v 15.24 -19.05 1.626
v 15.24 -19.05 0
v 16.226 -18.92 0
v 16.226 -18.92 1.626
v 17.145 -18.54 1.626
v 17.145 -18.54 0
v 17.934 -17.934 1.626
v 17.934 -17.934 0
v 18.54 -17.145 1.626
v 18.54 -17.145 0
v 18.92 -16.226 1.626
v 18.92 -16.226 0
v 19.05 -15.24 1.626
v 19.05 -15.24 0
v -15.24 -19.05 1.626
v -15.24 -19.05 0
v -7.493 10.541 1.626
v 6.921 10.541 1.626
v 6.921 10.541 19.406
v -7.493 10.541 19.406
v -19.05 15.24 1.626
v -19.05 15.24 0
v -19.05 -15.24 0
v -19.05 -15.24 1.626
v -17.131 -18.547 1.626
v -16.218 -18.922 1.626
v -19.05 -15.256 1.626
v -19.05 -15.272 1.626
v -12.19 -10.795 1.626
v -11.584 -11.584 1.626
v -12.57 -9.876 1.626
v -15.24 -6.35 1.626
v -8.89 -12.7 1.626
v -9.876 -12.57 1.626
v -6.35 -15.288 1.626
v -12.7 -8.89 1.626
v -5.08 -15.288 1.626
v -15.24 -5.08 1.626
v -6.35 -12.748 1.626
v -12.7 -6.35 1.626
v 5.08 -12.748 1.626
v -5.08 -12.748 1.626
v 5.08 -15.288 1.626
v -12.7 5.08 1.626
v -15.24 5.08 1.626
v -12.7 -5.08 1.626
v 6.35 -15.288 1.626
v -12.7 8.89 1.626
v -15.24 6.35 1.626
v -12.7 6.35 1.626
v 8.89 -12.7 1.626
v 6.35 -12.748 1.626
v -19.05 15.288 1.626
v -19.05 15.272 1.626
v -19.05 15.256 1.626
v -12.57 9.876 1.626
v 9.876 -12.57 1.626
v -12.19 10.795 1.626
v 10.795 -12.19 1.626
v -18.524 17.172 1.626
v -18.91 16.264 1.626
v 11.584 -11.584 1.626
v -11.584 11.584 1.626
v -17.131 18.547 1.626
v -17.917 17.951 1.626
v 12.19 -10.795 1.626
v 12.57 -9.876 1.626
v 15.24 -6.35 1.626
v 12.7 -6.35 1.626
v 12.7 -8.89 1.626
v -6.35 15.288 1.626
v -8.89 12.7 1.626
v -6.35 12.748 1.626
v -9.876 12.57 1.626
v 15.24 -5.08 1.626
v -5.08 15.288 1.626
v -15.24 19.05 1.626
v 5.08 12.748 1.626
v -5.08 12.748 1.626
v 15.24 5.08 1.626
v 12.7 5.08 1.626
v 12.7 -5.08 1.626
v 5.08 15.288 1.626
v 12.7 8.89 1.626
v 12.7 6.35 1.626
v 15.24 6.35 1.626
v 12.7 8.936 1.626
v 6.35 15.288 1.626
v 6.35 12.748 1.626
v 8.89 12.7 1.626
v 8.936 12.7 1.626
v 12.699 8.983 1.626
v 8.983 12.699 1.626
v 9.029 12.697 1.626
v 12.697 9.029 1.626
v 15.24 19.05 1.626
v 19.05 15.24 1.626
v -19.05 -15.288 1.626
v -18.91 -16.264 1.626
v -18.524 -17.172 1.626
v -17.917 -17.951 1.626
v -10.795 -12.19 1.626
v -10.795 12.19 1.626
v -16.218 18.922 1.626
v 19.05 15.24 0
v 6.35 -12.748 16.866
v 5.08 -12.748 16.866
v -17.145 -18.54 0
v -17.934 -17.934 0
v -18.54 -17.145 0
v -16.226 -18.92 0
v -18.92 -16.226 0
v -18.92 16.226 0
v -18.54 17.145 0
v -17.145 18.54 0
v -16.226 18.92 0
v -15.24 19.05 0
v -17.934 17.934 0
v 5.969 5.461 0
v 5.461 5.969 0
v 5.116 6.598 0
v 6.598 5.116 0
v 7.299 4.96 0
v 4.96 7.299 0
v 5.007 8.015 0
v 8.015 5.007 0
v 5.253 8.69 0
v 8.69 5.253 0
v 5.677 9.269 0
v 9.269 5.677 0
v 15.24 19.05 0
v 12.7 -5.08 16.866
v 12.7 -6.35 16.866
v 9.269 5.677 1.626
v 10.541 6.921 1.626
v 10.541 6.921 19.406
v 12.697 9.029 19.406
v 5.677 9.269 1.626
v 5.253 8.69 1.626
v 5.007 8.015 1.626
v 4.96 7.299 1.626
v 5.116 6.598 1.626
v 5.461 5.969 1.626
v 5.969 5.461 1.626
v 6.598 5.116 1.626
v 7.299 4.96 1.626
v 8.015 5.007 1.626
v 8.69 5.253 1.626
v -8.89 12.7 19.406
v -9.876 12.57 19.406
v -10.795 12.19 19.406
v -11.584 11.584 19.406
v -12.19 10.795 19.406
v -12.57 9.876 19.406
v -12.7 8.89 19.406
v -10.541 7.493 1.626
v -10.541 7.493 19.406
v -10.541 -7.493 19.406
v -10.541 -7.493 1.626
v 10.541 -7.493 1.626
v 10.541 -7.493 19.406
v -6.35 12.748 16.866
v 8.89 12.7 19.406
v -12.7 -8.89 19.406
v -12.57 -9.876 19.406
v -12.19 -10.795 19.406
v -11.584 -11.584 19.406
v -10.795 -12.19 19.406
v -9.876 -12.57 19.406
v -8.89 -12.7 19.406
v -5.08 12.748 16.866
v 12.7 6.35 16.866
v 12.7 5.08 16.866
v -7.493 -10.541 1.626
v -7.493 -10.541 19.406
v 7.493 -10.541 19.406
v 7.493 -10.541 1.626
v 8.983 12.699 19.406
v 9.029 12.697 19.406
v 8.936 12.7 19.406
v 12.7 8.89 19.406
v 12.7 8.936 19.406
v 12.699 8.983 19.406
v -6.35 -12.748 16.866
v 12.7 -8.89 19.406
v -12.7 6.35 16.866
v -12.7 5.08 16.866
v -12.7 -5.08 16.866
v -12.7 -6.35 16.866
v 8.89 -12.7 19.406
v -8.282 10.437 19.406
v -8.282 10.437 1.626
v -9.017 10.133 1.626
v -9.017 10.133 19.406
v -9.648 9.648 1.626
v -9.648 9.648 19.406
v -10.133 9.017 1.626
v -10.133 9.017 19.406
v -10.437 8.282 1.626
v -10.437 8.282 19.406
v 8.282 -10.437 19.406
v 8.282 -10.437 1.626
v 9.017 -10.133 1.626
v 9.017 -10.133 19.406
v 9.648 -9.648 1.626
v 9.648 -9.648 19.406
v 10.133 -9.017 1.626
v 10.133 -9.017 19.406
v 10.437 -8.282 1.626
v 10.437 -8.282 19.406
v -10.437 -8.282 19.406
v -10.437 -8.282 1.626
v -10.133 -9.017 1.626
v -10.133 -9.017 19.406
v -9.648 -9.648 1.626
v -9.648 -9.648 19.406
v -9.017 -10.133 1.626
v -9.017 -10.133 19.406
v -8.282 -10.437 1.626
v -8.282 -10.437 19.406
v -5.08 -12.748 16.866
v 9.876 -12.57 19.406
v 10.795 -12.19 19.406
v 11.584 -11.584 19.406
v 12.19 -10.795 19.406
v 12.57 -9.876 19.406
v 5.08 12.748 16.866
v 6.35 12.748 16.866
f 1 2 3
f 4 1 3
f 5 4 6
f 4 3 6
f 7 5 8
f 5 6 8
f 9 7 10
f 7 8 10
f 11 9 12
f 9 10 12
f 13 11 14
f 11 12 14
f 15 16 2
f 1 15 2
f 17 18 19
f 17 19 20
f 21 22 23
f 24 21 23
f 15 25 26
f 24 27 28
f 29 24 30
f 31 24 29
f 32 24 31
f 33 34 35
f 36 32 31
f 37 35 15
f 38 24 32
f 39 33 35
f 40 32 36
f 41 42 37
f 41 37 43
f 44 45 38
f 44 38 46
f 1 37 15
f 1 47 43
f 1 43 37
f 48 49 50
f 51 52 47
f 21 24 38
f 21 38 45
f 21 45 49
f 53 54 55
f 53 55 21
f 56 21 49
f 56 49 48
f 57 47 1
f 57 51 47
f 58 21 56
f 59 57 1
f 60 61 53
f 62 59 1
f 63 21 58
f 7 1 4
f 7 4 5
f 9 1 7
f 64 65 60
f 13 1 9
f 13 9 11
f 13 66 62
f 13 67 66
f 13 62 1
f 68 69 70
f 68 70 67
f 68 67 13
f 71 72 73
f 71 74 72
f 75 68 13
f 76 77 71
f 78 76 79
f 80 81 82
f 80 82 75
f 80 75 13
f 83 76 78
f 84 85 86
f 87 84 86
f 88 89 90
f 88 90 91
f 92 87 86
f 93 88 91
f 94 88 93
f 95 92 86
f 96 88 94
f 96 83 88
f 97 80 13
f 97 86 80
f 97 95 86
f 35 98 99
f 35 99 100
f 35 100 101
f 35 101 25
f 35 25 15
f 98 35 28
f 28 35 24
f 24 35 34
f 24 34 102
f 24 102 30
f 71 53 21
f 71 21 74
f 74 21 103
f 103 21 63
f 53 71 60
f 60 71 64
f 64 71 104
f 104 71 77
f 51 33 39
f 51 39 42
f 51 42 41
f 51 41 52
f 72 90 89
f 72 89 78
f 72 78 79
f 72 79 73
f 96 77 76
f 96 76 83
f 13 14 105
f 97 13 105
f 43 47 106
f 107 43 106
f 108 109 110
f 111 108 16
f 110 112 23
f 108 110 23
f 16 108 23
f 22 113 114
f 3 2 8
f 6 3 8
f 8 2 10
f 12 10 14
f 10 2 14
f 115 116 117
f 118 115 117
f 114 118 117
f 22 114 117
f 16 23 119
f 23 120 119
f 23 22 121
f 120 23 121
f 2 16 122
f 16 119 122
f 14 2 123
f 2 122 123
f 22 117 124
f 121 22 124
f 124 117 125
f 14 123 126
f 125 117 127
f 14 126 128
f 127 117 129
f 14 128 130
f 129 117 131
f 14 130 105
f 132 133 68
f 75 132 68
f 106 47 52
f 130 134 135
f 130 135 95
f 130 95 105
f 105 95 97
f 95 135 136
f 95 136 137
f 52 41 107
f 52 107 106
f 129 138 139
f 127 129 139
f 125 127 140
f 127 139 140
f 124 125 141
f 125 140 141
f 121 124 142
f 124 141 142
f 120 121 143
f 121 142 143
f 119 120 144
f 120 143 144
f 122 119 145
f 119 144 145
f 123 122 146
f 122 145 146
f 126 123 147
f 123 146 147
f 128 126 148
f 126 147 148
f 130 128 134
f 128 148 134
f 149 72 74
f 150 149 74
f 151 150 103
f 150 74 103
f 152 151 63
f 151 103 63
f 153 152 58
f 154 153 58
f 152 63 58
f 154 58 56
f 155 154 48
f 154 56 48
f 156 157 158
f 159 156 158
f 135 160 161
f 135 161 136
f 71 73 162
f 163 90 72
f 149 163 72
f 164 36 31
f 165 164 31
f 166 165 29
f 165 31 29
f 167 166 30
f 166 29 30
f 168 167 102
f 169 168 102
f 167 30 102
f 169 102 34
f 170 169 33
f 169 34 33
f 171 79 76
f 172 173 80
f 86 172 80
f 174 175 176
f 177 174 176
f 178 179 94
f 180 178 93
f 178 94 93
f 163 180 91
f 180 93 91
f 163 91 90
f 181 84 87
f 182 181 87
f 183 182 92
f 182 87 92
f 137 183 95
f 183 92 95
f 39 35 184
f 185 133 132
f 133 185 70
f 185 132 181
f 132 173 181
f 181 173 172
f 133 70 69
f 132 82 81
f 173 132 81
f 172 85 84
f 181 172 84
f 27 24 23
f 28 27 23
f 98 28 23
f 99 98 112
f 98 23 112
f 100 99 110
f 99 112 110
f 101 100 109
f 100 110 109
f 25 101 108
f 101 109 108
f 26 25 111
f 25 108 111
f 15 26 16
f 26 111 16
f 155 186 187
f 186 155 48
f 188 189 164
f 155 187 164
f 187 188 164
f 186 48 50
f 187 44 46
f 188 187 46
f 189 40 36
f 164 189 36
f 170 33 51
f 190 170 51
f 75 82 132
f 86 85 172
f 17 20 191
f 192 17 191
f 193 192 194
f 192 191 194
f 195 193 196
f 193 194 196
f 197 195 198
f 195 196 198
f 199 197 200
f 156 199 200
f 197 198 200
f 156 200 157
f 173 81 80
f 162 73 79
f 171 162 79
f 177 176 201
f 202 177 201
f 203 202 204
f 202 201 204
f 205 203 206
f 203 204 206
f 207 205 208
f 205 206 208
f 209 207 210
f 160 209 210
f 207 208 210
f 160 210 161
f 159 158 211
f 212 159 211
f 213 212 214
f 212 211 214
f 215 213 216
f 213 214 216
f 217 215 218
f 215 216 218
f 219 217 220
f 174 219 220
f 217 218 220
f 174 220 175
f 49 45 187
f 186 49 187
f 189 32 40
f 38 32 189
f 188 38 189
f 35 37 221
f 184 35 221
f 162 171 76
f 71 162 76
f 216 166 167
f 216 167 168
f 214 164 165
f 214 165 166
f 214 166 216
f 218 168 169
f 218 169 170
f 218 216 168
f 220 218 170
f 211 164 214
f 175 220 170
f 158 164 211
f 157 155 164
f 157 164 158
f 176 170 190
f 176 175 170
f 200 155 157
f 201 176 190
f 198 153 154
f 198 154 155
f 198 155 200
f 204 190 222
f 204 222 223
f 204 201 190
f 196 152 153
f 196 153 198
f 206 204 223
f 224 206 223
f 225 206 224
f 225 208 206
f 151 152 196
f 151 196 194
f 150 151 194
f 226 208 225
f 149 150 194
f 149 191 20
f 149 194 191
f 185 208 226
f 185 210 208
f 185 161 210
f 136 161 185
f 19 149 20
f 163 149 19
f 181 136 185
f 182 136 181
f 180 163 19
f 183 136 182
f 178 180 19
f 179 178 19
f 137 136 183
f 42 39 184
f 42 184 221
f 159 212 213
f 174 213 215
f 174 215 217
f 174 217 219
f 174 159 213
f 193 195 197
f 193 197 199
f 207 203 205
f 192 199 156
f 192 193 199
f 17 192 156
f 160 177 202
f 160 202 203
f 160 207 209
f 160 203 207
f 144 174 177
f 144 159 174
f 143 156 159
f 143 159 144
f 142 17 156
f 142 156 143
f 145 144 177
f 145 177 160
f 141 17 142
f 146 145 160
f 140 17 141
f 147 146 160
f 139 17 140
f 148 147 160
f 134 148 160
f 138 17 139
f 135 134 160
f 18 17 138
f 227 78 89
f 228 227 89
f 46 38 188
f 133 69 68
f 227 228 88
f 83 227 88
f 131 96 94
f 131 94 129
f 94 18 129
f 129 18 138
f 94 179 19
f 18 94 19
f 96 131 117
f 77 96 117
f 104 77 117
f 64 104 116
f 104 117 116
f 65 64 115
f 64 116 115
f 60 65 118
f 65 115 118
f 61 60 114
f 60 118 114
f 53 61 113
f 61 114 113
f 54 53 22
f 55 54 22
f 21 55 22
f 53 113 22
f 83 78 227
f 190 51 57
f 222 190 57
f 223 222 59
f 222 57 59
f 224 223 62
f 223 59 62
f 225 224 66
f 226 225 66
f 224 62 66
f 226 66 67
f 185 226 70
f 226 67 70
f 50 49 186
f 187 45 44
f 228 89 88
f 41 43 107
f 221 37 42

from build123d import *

# Parameters (mm, degrees)
F1_DEPTH       = 1.6256
F3_DEPTH       = 17.78
F5_DEPTH       = 17.78
F6_W           = 2.54
F6_H           = 1.27
F6_W_2         = 1.27
F6_H_2         = 2.54
F7_DEPTH       = 15.24
F9_DEPTH       = 25.401
F11_DEPTH      = 25.401
F13_DEPTH      = 1.6266
F13_DEPTH_BACK = 17.781


with BuildPart() as f1:
    # F0 (on Top) → F1 (new body)
    with BuildSketch(Plane.XY):
        with BuildLine():
            Line((-15.24, -19.05), (15.24, -19.05))
            ThreePointArc((15.24, -19.05), (17.9340768363, -17.9340768363), (19.05, -15.24))
            Line((19.05, -15.24), (19.05, 15.24))
            ThreePointArc((19.05, 15.24), (17.9340768363, 17.9340768363), (15.24, 19.05))
            Line((15.24, 19.05), (-15.24, 19.05))
            ThreePointArc((-15.24, 19.05), (-17.9340768363, 17.9340768363), (-19.05, 15.24))
            Line((-19.05, 15.24), (-19.05, -15.24))
            ThreePointArc((-19.05, -15.24), (-17.9340768363, -17.9340768363), (-15.24, -19.05))
        make_face()
    extrude(amount=F1_DEPTH)

    # F2 (on face) → F3 (join)
    with BuildSketch(Plane.XY.offset(1.6256)):
        with BuildLine():
            Line((-8.89, -12.7), (8.89, -12.7))
            ThreePointArc((8.89, -12.7), (11.5840768363, -11.5840768363), (12.7, -8.89))
            Line((12.7, -8.89), (12.7, 8.89))
            ThreePointArc((12.7, 8.89), (11.5840768363, 11.5840768363), (8.89, 12.7))
            Line((8.89, 12.7), (-8.89, 12.7))
            ThreePointArc((-8.89, 12.7), (-11.5840768363, 11.5840768363), (-12.7, 8.89))
            Line((-12.7, 8.89), (-12.7, -8.89))
            ThreePointArc((-12.7, -8.89), (-11.5840768363, -11.5840768363), (-8.89, -12.7))
        make_face()
    extrude(amount=F3_DEPTH)

    # F4 (on face) → F5 (cut, through all)
    with BuildSketch(Plane.XY.offset(19.4056)):
        with BuildLine():
            ThreePointArc((-10.541, -7.493), (-9.6482614691, -9.6482614691), (-7.493, -10.541))
            Line((-7.493, -10.541), (7.493, -10.541))
            ThreePointArc((7.493, -10.541), (9.6482614691, -9.6482614691), (10.541, -7.493))
            Line((10.541, -7.493), (10.541, 7.493))
            ThreePointArc((10.541, 7.493), (9.6482614691, 9.6482614691), (7.493, 10.541))
            Line((7.493, 10.541), (-7.493, 10.541))
            ThreePointArc((-7.493, 10.541), (-9.6482614691, 9.6482614691), (-10.541, 7.493))
            Line((-10.541, 7.493), (-10.541, -7.493))
        make_face()
    extrude(amount=-F5_DEPTH, mode=Mode.SUBTRACT)

    # F6 (on face) → F7 (join)
    with BuildSketch(Plane.XY.offset(1.6256)):
        with Locations((13.97, 5.715)):
            Rectangle(F6_W, F6_H)
        with Locations((-13.97, 5.715)):
            Rectangle(F6_W, F6_H)
        with Locations((-13.97, -5.715)):
            Rectangle(F6_W, F6_H)
        with Locations((13.97, -5.715)):
            Rectangle(F6_W, F6_H)
        with Locations((5.715, 14.0176649359)):
            Rectangle(F6_W_2, F6_H_2)
        with Locations((-5.715, 14.0176649359)):
            Rectangle(F6_W_2, F6_H_2)
        with Locations((5.715, -14.0176649359)):
            Rectangle(F6_W_2, F6_H_2)
        with Locations((-5.715, -14.0176649359)):
            Rectangle(F6_W_2, F6_H_2)
    extrude(amount=F7_DEPTH)

    # F8 (on face) → F9 (cut, through all)
    with BuildSketch(Plane.XZ.offset(6.35)):
        Polygon((15.24, 16.8656), (12.7, 16.8656), (15.24, 1.6256), align=None)
        Polygon((-15.24, 1.6256), (-12.7, 16.8656), (-15.24, 16.8656), align=None)
    extrude(amount=-F9_DEPTH, mode=Mode.SUBTRACT)

    # F10 (on face) → F11 (cut, through all)
    with BuildSketch(Plane.YZ.offset(6.35)):
        Polygon((15.2876649359, 16.8656), (12.7476649359, 16.8656), (15.2876649359, 1.6256), align=None)
        Polygon((-15.2876649359, 1.6256), (-12.7476649359, 16.8656), (-15.2876649359, 16.8656), align=None)
    extrude(amount=-F11_DEPTH, mode=Mode.SUBTRACT)

    # F12 (on face) → F13 (cut, two sides)
    with BuildSketch(Plane.XY.offset(1.6256)) as f13_sk:
        with BuildLine():
            Line((15.24, 19.05), (5.6768122097, 9.268686321))
            ThreePointArc((5.6768122097, 9.268686321), (5.6969487758, 5.6969487758), (9.268686321, 5.6768122097))
            Line((9.268686321, 5.6768122097), (19.05, 15.24))
            ThreePointArc((19.05, 15.24), (17.9340768363, 17.9340768363), (15.24, 19.05))
        make_face()
    extrude(amount=-F13_DEPTH, mode=Mode.SUBTRACT)
    extrude(f13_sk.sketch, amount=F13_DEPTH_BACK, mode=Mode.SUBTRACT)


solid = f1.part
